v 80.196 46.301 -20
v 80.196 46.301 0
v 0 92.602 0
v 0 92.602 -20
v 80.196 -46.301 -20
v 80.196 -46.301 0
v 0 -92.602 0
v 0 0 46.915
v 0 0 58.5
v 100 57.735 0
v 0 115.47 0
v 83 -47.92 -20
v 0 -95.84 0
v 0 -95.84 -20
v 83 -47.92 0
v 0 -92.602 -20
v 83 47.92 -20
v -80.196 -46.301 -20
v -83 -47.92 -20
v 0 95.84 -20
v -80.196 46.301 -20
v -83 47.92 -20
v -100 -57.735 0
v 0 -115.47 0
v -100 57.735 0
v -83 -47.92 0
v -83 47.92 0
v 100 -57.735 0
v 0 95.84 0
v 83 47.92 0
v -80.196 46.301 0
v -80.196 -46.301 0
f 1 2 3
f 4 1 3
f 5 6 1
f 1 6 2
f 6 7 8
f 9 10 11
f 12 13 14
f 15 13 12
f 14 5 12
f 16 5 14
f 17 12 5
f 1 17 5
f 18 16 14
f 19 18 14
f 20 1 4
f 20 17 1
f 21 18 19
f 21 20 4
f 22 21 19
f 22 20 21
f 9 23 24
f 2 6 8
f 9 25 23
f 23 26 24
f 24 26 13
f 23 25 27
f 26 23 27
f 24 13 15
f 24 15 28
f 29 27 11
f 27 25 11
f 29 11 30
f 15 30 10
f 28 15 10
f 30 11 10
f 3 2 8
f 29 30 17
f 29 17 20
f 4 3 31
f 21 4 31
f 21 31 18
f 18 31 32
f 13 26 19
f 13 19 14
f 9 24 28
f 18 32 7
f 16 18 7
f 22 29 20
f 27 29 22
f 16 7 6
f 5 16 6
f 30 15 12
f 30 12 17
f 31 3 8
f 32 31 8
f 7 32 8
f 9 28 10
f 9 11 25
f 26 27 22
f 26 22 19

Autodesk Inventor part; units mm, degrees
ref_plane "YZ Plane" through (0, 0, 0) normal (1, 0, 0) x (0, 1, 0)
ref_plane "XZ Plane" through (0, 0, 0) normal (0, 1, 0) x (-1, 0, 0)
sketch "Sketch1" plane through (0, 0, 0) normal (0, 0, 1) x (1, 0, 0)
  line L0 (-100, 57.735) -> (0, 115.4701)
  line L1 (0, 115.4701) -> (100, 57.735)
  line L2 (100, 57.735) -> (100, -57.735)
  line L3 (100, -57.735) -> (0, -115.4701)
  line L4 (0, -115.4701) -> (-100, -57.735)
  line L5 (-100, -57.735) -> (-100, 57.735)
  line L6 (-95, 54.8483) -> (0, 109.6966)
  line L7 (0, 109.6966) -> (95, 54.8483)
  line L8 (95, 54.8483) -> (95, -54.8483)
  line L9 (95, -54.8483) -> (0, -109.6966)
  line L10 (0, -109.6966) -> (-95, -54.8483)
  line L11 (-95, -54.8483) -> (-95, 54.8483)
  line L12 (-100, -57.735) -> (0, 0)
  line L13 (0, 0) -> (0, -115.4701)
  line L14 (100, -57.735) -> (0, 0)
  line L15 (100, 57.735) -> (0, 0)
  line L16 (0, 115.4701) -> (0, 0)
  line L17 (-100, 57.735) -> (0, 0)
  line L18 (0, -109.6966) -> (0, 0)
  line L19 (95, -54.8483) -> (0, 0)
  line L20 (95, 54.8483) -> (0, 0)
  line L21 (0, 109.6966) -> (0, 0)
  line L22 (-95, 54.8483) -> (0, 0)
  line L23 (-95, -54.8483) -> (0, 0)
  dimension "d0" = 200
  dimension "d1" = 190
ref_plane "Work Plane1" through (0, 0, 58.5) normal (0, 0, 1) x (1, 0, 0)
sketch "Sketch2" plane through (0, 0, 58.5) normal (0, 0, 1) x (1, 0, 0)
  point P0 (0, 0)
  point P1 (0, 0)
extrude "Extrusion1" add sketch "Sketch1" along normal up to surface (58.5 mm away)
loft "Loft1" cut keep common part section 1 edges at (-50, -86.6025, 0) (-100, 0, 0) (-50, 86.6025, 0) (50, 86.6025, 0) (100, 0, 0) (50, -86.6025, 0) section 2 point at (0, 0, 58.5)
shell "Shell1" thickness 10 removed faces 1 at (0, 0, 0)
sketch "Sketch4" plane through (0, 0, 0) normal (0, 0, -1) x (-1, 0, 0)
  line L0 (0, -92.6022) -> (-80.1958, -46.3011) projected
  line L1 (0, -92.6022) -> (-80.1958, -46.3011)
  line L2 (-80.1958, -46.3011) -> (-80.1958, 46.3011)
  line L3 (-80.1958, 46.3011) -> (0, 92.6022)
  line L4 (0, 92.6022) -> (80.1958, 46.3011)
  line L5 (80.1958, 46.3011) -> (80.1958, -46.3011)
  line L6 (80.1958, -46.3011) -> (0, -92.6022)
  line L7 (0, -95.8401) -> (-83, -47.9201)
  line L8 (-83, -47.9201) -> (-83, 47.9201)
  line L9 (-83, 47.9201) -> (0, 95.8401)
  line L10 (0, 95.8401) -> (83, 47.9201)
  line L11 (83, 47.9201) -> (83, -47.9201)
  line L12 (83, -47.9201) -> (0, -95.8401)
  line L13 (83, -47.9201) -> (80.1958, -46.3011)
  line L14 (0, -95.8401) -> (0, -92.6022)
  line L15 (-83, -47.9201) -> (-80.1958, -46.3011)
  line L16 (-83, 47.9201) -> (-80.1958, 46.3011)
  line L17 (0, 95.8401) -> (0, 92.6022)
  line L18 (80.1958, 46.3011) -> (83, 47.9201)
  point P0 (0, 0)
  point P1 (0, 0)
  point P2 (0, 0)
  dimension "d18" = 166
extrude "Extrusion3" add sketch "Sketch4" along normal blind 20 contours L14 L7 L15 L0 | L6 L13 L12 L14 | L15 L8 L16 L2 | L5 L18 L11 L13 | L16 L9 L17 L3 | L4 L17 L10 L18
properties part number "Phage_Hat"
